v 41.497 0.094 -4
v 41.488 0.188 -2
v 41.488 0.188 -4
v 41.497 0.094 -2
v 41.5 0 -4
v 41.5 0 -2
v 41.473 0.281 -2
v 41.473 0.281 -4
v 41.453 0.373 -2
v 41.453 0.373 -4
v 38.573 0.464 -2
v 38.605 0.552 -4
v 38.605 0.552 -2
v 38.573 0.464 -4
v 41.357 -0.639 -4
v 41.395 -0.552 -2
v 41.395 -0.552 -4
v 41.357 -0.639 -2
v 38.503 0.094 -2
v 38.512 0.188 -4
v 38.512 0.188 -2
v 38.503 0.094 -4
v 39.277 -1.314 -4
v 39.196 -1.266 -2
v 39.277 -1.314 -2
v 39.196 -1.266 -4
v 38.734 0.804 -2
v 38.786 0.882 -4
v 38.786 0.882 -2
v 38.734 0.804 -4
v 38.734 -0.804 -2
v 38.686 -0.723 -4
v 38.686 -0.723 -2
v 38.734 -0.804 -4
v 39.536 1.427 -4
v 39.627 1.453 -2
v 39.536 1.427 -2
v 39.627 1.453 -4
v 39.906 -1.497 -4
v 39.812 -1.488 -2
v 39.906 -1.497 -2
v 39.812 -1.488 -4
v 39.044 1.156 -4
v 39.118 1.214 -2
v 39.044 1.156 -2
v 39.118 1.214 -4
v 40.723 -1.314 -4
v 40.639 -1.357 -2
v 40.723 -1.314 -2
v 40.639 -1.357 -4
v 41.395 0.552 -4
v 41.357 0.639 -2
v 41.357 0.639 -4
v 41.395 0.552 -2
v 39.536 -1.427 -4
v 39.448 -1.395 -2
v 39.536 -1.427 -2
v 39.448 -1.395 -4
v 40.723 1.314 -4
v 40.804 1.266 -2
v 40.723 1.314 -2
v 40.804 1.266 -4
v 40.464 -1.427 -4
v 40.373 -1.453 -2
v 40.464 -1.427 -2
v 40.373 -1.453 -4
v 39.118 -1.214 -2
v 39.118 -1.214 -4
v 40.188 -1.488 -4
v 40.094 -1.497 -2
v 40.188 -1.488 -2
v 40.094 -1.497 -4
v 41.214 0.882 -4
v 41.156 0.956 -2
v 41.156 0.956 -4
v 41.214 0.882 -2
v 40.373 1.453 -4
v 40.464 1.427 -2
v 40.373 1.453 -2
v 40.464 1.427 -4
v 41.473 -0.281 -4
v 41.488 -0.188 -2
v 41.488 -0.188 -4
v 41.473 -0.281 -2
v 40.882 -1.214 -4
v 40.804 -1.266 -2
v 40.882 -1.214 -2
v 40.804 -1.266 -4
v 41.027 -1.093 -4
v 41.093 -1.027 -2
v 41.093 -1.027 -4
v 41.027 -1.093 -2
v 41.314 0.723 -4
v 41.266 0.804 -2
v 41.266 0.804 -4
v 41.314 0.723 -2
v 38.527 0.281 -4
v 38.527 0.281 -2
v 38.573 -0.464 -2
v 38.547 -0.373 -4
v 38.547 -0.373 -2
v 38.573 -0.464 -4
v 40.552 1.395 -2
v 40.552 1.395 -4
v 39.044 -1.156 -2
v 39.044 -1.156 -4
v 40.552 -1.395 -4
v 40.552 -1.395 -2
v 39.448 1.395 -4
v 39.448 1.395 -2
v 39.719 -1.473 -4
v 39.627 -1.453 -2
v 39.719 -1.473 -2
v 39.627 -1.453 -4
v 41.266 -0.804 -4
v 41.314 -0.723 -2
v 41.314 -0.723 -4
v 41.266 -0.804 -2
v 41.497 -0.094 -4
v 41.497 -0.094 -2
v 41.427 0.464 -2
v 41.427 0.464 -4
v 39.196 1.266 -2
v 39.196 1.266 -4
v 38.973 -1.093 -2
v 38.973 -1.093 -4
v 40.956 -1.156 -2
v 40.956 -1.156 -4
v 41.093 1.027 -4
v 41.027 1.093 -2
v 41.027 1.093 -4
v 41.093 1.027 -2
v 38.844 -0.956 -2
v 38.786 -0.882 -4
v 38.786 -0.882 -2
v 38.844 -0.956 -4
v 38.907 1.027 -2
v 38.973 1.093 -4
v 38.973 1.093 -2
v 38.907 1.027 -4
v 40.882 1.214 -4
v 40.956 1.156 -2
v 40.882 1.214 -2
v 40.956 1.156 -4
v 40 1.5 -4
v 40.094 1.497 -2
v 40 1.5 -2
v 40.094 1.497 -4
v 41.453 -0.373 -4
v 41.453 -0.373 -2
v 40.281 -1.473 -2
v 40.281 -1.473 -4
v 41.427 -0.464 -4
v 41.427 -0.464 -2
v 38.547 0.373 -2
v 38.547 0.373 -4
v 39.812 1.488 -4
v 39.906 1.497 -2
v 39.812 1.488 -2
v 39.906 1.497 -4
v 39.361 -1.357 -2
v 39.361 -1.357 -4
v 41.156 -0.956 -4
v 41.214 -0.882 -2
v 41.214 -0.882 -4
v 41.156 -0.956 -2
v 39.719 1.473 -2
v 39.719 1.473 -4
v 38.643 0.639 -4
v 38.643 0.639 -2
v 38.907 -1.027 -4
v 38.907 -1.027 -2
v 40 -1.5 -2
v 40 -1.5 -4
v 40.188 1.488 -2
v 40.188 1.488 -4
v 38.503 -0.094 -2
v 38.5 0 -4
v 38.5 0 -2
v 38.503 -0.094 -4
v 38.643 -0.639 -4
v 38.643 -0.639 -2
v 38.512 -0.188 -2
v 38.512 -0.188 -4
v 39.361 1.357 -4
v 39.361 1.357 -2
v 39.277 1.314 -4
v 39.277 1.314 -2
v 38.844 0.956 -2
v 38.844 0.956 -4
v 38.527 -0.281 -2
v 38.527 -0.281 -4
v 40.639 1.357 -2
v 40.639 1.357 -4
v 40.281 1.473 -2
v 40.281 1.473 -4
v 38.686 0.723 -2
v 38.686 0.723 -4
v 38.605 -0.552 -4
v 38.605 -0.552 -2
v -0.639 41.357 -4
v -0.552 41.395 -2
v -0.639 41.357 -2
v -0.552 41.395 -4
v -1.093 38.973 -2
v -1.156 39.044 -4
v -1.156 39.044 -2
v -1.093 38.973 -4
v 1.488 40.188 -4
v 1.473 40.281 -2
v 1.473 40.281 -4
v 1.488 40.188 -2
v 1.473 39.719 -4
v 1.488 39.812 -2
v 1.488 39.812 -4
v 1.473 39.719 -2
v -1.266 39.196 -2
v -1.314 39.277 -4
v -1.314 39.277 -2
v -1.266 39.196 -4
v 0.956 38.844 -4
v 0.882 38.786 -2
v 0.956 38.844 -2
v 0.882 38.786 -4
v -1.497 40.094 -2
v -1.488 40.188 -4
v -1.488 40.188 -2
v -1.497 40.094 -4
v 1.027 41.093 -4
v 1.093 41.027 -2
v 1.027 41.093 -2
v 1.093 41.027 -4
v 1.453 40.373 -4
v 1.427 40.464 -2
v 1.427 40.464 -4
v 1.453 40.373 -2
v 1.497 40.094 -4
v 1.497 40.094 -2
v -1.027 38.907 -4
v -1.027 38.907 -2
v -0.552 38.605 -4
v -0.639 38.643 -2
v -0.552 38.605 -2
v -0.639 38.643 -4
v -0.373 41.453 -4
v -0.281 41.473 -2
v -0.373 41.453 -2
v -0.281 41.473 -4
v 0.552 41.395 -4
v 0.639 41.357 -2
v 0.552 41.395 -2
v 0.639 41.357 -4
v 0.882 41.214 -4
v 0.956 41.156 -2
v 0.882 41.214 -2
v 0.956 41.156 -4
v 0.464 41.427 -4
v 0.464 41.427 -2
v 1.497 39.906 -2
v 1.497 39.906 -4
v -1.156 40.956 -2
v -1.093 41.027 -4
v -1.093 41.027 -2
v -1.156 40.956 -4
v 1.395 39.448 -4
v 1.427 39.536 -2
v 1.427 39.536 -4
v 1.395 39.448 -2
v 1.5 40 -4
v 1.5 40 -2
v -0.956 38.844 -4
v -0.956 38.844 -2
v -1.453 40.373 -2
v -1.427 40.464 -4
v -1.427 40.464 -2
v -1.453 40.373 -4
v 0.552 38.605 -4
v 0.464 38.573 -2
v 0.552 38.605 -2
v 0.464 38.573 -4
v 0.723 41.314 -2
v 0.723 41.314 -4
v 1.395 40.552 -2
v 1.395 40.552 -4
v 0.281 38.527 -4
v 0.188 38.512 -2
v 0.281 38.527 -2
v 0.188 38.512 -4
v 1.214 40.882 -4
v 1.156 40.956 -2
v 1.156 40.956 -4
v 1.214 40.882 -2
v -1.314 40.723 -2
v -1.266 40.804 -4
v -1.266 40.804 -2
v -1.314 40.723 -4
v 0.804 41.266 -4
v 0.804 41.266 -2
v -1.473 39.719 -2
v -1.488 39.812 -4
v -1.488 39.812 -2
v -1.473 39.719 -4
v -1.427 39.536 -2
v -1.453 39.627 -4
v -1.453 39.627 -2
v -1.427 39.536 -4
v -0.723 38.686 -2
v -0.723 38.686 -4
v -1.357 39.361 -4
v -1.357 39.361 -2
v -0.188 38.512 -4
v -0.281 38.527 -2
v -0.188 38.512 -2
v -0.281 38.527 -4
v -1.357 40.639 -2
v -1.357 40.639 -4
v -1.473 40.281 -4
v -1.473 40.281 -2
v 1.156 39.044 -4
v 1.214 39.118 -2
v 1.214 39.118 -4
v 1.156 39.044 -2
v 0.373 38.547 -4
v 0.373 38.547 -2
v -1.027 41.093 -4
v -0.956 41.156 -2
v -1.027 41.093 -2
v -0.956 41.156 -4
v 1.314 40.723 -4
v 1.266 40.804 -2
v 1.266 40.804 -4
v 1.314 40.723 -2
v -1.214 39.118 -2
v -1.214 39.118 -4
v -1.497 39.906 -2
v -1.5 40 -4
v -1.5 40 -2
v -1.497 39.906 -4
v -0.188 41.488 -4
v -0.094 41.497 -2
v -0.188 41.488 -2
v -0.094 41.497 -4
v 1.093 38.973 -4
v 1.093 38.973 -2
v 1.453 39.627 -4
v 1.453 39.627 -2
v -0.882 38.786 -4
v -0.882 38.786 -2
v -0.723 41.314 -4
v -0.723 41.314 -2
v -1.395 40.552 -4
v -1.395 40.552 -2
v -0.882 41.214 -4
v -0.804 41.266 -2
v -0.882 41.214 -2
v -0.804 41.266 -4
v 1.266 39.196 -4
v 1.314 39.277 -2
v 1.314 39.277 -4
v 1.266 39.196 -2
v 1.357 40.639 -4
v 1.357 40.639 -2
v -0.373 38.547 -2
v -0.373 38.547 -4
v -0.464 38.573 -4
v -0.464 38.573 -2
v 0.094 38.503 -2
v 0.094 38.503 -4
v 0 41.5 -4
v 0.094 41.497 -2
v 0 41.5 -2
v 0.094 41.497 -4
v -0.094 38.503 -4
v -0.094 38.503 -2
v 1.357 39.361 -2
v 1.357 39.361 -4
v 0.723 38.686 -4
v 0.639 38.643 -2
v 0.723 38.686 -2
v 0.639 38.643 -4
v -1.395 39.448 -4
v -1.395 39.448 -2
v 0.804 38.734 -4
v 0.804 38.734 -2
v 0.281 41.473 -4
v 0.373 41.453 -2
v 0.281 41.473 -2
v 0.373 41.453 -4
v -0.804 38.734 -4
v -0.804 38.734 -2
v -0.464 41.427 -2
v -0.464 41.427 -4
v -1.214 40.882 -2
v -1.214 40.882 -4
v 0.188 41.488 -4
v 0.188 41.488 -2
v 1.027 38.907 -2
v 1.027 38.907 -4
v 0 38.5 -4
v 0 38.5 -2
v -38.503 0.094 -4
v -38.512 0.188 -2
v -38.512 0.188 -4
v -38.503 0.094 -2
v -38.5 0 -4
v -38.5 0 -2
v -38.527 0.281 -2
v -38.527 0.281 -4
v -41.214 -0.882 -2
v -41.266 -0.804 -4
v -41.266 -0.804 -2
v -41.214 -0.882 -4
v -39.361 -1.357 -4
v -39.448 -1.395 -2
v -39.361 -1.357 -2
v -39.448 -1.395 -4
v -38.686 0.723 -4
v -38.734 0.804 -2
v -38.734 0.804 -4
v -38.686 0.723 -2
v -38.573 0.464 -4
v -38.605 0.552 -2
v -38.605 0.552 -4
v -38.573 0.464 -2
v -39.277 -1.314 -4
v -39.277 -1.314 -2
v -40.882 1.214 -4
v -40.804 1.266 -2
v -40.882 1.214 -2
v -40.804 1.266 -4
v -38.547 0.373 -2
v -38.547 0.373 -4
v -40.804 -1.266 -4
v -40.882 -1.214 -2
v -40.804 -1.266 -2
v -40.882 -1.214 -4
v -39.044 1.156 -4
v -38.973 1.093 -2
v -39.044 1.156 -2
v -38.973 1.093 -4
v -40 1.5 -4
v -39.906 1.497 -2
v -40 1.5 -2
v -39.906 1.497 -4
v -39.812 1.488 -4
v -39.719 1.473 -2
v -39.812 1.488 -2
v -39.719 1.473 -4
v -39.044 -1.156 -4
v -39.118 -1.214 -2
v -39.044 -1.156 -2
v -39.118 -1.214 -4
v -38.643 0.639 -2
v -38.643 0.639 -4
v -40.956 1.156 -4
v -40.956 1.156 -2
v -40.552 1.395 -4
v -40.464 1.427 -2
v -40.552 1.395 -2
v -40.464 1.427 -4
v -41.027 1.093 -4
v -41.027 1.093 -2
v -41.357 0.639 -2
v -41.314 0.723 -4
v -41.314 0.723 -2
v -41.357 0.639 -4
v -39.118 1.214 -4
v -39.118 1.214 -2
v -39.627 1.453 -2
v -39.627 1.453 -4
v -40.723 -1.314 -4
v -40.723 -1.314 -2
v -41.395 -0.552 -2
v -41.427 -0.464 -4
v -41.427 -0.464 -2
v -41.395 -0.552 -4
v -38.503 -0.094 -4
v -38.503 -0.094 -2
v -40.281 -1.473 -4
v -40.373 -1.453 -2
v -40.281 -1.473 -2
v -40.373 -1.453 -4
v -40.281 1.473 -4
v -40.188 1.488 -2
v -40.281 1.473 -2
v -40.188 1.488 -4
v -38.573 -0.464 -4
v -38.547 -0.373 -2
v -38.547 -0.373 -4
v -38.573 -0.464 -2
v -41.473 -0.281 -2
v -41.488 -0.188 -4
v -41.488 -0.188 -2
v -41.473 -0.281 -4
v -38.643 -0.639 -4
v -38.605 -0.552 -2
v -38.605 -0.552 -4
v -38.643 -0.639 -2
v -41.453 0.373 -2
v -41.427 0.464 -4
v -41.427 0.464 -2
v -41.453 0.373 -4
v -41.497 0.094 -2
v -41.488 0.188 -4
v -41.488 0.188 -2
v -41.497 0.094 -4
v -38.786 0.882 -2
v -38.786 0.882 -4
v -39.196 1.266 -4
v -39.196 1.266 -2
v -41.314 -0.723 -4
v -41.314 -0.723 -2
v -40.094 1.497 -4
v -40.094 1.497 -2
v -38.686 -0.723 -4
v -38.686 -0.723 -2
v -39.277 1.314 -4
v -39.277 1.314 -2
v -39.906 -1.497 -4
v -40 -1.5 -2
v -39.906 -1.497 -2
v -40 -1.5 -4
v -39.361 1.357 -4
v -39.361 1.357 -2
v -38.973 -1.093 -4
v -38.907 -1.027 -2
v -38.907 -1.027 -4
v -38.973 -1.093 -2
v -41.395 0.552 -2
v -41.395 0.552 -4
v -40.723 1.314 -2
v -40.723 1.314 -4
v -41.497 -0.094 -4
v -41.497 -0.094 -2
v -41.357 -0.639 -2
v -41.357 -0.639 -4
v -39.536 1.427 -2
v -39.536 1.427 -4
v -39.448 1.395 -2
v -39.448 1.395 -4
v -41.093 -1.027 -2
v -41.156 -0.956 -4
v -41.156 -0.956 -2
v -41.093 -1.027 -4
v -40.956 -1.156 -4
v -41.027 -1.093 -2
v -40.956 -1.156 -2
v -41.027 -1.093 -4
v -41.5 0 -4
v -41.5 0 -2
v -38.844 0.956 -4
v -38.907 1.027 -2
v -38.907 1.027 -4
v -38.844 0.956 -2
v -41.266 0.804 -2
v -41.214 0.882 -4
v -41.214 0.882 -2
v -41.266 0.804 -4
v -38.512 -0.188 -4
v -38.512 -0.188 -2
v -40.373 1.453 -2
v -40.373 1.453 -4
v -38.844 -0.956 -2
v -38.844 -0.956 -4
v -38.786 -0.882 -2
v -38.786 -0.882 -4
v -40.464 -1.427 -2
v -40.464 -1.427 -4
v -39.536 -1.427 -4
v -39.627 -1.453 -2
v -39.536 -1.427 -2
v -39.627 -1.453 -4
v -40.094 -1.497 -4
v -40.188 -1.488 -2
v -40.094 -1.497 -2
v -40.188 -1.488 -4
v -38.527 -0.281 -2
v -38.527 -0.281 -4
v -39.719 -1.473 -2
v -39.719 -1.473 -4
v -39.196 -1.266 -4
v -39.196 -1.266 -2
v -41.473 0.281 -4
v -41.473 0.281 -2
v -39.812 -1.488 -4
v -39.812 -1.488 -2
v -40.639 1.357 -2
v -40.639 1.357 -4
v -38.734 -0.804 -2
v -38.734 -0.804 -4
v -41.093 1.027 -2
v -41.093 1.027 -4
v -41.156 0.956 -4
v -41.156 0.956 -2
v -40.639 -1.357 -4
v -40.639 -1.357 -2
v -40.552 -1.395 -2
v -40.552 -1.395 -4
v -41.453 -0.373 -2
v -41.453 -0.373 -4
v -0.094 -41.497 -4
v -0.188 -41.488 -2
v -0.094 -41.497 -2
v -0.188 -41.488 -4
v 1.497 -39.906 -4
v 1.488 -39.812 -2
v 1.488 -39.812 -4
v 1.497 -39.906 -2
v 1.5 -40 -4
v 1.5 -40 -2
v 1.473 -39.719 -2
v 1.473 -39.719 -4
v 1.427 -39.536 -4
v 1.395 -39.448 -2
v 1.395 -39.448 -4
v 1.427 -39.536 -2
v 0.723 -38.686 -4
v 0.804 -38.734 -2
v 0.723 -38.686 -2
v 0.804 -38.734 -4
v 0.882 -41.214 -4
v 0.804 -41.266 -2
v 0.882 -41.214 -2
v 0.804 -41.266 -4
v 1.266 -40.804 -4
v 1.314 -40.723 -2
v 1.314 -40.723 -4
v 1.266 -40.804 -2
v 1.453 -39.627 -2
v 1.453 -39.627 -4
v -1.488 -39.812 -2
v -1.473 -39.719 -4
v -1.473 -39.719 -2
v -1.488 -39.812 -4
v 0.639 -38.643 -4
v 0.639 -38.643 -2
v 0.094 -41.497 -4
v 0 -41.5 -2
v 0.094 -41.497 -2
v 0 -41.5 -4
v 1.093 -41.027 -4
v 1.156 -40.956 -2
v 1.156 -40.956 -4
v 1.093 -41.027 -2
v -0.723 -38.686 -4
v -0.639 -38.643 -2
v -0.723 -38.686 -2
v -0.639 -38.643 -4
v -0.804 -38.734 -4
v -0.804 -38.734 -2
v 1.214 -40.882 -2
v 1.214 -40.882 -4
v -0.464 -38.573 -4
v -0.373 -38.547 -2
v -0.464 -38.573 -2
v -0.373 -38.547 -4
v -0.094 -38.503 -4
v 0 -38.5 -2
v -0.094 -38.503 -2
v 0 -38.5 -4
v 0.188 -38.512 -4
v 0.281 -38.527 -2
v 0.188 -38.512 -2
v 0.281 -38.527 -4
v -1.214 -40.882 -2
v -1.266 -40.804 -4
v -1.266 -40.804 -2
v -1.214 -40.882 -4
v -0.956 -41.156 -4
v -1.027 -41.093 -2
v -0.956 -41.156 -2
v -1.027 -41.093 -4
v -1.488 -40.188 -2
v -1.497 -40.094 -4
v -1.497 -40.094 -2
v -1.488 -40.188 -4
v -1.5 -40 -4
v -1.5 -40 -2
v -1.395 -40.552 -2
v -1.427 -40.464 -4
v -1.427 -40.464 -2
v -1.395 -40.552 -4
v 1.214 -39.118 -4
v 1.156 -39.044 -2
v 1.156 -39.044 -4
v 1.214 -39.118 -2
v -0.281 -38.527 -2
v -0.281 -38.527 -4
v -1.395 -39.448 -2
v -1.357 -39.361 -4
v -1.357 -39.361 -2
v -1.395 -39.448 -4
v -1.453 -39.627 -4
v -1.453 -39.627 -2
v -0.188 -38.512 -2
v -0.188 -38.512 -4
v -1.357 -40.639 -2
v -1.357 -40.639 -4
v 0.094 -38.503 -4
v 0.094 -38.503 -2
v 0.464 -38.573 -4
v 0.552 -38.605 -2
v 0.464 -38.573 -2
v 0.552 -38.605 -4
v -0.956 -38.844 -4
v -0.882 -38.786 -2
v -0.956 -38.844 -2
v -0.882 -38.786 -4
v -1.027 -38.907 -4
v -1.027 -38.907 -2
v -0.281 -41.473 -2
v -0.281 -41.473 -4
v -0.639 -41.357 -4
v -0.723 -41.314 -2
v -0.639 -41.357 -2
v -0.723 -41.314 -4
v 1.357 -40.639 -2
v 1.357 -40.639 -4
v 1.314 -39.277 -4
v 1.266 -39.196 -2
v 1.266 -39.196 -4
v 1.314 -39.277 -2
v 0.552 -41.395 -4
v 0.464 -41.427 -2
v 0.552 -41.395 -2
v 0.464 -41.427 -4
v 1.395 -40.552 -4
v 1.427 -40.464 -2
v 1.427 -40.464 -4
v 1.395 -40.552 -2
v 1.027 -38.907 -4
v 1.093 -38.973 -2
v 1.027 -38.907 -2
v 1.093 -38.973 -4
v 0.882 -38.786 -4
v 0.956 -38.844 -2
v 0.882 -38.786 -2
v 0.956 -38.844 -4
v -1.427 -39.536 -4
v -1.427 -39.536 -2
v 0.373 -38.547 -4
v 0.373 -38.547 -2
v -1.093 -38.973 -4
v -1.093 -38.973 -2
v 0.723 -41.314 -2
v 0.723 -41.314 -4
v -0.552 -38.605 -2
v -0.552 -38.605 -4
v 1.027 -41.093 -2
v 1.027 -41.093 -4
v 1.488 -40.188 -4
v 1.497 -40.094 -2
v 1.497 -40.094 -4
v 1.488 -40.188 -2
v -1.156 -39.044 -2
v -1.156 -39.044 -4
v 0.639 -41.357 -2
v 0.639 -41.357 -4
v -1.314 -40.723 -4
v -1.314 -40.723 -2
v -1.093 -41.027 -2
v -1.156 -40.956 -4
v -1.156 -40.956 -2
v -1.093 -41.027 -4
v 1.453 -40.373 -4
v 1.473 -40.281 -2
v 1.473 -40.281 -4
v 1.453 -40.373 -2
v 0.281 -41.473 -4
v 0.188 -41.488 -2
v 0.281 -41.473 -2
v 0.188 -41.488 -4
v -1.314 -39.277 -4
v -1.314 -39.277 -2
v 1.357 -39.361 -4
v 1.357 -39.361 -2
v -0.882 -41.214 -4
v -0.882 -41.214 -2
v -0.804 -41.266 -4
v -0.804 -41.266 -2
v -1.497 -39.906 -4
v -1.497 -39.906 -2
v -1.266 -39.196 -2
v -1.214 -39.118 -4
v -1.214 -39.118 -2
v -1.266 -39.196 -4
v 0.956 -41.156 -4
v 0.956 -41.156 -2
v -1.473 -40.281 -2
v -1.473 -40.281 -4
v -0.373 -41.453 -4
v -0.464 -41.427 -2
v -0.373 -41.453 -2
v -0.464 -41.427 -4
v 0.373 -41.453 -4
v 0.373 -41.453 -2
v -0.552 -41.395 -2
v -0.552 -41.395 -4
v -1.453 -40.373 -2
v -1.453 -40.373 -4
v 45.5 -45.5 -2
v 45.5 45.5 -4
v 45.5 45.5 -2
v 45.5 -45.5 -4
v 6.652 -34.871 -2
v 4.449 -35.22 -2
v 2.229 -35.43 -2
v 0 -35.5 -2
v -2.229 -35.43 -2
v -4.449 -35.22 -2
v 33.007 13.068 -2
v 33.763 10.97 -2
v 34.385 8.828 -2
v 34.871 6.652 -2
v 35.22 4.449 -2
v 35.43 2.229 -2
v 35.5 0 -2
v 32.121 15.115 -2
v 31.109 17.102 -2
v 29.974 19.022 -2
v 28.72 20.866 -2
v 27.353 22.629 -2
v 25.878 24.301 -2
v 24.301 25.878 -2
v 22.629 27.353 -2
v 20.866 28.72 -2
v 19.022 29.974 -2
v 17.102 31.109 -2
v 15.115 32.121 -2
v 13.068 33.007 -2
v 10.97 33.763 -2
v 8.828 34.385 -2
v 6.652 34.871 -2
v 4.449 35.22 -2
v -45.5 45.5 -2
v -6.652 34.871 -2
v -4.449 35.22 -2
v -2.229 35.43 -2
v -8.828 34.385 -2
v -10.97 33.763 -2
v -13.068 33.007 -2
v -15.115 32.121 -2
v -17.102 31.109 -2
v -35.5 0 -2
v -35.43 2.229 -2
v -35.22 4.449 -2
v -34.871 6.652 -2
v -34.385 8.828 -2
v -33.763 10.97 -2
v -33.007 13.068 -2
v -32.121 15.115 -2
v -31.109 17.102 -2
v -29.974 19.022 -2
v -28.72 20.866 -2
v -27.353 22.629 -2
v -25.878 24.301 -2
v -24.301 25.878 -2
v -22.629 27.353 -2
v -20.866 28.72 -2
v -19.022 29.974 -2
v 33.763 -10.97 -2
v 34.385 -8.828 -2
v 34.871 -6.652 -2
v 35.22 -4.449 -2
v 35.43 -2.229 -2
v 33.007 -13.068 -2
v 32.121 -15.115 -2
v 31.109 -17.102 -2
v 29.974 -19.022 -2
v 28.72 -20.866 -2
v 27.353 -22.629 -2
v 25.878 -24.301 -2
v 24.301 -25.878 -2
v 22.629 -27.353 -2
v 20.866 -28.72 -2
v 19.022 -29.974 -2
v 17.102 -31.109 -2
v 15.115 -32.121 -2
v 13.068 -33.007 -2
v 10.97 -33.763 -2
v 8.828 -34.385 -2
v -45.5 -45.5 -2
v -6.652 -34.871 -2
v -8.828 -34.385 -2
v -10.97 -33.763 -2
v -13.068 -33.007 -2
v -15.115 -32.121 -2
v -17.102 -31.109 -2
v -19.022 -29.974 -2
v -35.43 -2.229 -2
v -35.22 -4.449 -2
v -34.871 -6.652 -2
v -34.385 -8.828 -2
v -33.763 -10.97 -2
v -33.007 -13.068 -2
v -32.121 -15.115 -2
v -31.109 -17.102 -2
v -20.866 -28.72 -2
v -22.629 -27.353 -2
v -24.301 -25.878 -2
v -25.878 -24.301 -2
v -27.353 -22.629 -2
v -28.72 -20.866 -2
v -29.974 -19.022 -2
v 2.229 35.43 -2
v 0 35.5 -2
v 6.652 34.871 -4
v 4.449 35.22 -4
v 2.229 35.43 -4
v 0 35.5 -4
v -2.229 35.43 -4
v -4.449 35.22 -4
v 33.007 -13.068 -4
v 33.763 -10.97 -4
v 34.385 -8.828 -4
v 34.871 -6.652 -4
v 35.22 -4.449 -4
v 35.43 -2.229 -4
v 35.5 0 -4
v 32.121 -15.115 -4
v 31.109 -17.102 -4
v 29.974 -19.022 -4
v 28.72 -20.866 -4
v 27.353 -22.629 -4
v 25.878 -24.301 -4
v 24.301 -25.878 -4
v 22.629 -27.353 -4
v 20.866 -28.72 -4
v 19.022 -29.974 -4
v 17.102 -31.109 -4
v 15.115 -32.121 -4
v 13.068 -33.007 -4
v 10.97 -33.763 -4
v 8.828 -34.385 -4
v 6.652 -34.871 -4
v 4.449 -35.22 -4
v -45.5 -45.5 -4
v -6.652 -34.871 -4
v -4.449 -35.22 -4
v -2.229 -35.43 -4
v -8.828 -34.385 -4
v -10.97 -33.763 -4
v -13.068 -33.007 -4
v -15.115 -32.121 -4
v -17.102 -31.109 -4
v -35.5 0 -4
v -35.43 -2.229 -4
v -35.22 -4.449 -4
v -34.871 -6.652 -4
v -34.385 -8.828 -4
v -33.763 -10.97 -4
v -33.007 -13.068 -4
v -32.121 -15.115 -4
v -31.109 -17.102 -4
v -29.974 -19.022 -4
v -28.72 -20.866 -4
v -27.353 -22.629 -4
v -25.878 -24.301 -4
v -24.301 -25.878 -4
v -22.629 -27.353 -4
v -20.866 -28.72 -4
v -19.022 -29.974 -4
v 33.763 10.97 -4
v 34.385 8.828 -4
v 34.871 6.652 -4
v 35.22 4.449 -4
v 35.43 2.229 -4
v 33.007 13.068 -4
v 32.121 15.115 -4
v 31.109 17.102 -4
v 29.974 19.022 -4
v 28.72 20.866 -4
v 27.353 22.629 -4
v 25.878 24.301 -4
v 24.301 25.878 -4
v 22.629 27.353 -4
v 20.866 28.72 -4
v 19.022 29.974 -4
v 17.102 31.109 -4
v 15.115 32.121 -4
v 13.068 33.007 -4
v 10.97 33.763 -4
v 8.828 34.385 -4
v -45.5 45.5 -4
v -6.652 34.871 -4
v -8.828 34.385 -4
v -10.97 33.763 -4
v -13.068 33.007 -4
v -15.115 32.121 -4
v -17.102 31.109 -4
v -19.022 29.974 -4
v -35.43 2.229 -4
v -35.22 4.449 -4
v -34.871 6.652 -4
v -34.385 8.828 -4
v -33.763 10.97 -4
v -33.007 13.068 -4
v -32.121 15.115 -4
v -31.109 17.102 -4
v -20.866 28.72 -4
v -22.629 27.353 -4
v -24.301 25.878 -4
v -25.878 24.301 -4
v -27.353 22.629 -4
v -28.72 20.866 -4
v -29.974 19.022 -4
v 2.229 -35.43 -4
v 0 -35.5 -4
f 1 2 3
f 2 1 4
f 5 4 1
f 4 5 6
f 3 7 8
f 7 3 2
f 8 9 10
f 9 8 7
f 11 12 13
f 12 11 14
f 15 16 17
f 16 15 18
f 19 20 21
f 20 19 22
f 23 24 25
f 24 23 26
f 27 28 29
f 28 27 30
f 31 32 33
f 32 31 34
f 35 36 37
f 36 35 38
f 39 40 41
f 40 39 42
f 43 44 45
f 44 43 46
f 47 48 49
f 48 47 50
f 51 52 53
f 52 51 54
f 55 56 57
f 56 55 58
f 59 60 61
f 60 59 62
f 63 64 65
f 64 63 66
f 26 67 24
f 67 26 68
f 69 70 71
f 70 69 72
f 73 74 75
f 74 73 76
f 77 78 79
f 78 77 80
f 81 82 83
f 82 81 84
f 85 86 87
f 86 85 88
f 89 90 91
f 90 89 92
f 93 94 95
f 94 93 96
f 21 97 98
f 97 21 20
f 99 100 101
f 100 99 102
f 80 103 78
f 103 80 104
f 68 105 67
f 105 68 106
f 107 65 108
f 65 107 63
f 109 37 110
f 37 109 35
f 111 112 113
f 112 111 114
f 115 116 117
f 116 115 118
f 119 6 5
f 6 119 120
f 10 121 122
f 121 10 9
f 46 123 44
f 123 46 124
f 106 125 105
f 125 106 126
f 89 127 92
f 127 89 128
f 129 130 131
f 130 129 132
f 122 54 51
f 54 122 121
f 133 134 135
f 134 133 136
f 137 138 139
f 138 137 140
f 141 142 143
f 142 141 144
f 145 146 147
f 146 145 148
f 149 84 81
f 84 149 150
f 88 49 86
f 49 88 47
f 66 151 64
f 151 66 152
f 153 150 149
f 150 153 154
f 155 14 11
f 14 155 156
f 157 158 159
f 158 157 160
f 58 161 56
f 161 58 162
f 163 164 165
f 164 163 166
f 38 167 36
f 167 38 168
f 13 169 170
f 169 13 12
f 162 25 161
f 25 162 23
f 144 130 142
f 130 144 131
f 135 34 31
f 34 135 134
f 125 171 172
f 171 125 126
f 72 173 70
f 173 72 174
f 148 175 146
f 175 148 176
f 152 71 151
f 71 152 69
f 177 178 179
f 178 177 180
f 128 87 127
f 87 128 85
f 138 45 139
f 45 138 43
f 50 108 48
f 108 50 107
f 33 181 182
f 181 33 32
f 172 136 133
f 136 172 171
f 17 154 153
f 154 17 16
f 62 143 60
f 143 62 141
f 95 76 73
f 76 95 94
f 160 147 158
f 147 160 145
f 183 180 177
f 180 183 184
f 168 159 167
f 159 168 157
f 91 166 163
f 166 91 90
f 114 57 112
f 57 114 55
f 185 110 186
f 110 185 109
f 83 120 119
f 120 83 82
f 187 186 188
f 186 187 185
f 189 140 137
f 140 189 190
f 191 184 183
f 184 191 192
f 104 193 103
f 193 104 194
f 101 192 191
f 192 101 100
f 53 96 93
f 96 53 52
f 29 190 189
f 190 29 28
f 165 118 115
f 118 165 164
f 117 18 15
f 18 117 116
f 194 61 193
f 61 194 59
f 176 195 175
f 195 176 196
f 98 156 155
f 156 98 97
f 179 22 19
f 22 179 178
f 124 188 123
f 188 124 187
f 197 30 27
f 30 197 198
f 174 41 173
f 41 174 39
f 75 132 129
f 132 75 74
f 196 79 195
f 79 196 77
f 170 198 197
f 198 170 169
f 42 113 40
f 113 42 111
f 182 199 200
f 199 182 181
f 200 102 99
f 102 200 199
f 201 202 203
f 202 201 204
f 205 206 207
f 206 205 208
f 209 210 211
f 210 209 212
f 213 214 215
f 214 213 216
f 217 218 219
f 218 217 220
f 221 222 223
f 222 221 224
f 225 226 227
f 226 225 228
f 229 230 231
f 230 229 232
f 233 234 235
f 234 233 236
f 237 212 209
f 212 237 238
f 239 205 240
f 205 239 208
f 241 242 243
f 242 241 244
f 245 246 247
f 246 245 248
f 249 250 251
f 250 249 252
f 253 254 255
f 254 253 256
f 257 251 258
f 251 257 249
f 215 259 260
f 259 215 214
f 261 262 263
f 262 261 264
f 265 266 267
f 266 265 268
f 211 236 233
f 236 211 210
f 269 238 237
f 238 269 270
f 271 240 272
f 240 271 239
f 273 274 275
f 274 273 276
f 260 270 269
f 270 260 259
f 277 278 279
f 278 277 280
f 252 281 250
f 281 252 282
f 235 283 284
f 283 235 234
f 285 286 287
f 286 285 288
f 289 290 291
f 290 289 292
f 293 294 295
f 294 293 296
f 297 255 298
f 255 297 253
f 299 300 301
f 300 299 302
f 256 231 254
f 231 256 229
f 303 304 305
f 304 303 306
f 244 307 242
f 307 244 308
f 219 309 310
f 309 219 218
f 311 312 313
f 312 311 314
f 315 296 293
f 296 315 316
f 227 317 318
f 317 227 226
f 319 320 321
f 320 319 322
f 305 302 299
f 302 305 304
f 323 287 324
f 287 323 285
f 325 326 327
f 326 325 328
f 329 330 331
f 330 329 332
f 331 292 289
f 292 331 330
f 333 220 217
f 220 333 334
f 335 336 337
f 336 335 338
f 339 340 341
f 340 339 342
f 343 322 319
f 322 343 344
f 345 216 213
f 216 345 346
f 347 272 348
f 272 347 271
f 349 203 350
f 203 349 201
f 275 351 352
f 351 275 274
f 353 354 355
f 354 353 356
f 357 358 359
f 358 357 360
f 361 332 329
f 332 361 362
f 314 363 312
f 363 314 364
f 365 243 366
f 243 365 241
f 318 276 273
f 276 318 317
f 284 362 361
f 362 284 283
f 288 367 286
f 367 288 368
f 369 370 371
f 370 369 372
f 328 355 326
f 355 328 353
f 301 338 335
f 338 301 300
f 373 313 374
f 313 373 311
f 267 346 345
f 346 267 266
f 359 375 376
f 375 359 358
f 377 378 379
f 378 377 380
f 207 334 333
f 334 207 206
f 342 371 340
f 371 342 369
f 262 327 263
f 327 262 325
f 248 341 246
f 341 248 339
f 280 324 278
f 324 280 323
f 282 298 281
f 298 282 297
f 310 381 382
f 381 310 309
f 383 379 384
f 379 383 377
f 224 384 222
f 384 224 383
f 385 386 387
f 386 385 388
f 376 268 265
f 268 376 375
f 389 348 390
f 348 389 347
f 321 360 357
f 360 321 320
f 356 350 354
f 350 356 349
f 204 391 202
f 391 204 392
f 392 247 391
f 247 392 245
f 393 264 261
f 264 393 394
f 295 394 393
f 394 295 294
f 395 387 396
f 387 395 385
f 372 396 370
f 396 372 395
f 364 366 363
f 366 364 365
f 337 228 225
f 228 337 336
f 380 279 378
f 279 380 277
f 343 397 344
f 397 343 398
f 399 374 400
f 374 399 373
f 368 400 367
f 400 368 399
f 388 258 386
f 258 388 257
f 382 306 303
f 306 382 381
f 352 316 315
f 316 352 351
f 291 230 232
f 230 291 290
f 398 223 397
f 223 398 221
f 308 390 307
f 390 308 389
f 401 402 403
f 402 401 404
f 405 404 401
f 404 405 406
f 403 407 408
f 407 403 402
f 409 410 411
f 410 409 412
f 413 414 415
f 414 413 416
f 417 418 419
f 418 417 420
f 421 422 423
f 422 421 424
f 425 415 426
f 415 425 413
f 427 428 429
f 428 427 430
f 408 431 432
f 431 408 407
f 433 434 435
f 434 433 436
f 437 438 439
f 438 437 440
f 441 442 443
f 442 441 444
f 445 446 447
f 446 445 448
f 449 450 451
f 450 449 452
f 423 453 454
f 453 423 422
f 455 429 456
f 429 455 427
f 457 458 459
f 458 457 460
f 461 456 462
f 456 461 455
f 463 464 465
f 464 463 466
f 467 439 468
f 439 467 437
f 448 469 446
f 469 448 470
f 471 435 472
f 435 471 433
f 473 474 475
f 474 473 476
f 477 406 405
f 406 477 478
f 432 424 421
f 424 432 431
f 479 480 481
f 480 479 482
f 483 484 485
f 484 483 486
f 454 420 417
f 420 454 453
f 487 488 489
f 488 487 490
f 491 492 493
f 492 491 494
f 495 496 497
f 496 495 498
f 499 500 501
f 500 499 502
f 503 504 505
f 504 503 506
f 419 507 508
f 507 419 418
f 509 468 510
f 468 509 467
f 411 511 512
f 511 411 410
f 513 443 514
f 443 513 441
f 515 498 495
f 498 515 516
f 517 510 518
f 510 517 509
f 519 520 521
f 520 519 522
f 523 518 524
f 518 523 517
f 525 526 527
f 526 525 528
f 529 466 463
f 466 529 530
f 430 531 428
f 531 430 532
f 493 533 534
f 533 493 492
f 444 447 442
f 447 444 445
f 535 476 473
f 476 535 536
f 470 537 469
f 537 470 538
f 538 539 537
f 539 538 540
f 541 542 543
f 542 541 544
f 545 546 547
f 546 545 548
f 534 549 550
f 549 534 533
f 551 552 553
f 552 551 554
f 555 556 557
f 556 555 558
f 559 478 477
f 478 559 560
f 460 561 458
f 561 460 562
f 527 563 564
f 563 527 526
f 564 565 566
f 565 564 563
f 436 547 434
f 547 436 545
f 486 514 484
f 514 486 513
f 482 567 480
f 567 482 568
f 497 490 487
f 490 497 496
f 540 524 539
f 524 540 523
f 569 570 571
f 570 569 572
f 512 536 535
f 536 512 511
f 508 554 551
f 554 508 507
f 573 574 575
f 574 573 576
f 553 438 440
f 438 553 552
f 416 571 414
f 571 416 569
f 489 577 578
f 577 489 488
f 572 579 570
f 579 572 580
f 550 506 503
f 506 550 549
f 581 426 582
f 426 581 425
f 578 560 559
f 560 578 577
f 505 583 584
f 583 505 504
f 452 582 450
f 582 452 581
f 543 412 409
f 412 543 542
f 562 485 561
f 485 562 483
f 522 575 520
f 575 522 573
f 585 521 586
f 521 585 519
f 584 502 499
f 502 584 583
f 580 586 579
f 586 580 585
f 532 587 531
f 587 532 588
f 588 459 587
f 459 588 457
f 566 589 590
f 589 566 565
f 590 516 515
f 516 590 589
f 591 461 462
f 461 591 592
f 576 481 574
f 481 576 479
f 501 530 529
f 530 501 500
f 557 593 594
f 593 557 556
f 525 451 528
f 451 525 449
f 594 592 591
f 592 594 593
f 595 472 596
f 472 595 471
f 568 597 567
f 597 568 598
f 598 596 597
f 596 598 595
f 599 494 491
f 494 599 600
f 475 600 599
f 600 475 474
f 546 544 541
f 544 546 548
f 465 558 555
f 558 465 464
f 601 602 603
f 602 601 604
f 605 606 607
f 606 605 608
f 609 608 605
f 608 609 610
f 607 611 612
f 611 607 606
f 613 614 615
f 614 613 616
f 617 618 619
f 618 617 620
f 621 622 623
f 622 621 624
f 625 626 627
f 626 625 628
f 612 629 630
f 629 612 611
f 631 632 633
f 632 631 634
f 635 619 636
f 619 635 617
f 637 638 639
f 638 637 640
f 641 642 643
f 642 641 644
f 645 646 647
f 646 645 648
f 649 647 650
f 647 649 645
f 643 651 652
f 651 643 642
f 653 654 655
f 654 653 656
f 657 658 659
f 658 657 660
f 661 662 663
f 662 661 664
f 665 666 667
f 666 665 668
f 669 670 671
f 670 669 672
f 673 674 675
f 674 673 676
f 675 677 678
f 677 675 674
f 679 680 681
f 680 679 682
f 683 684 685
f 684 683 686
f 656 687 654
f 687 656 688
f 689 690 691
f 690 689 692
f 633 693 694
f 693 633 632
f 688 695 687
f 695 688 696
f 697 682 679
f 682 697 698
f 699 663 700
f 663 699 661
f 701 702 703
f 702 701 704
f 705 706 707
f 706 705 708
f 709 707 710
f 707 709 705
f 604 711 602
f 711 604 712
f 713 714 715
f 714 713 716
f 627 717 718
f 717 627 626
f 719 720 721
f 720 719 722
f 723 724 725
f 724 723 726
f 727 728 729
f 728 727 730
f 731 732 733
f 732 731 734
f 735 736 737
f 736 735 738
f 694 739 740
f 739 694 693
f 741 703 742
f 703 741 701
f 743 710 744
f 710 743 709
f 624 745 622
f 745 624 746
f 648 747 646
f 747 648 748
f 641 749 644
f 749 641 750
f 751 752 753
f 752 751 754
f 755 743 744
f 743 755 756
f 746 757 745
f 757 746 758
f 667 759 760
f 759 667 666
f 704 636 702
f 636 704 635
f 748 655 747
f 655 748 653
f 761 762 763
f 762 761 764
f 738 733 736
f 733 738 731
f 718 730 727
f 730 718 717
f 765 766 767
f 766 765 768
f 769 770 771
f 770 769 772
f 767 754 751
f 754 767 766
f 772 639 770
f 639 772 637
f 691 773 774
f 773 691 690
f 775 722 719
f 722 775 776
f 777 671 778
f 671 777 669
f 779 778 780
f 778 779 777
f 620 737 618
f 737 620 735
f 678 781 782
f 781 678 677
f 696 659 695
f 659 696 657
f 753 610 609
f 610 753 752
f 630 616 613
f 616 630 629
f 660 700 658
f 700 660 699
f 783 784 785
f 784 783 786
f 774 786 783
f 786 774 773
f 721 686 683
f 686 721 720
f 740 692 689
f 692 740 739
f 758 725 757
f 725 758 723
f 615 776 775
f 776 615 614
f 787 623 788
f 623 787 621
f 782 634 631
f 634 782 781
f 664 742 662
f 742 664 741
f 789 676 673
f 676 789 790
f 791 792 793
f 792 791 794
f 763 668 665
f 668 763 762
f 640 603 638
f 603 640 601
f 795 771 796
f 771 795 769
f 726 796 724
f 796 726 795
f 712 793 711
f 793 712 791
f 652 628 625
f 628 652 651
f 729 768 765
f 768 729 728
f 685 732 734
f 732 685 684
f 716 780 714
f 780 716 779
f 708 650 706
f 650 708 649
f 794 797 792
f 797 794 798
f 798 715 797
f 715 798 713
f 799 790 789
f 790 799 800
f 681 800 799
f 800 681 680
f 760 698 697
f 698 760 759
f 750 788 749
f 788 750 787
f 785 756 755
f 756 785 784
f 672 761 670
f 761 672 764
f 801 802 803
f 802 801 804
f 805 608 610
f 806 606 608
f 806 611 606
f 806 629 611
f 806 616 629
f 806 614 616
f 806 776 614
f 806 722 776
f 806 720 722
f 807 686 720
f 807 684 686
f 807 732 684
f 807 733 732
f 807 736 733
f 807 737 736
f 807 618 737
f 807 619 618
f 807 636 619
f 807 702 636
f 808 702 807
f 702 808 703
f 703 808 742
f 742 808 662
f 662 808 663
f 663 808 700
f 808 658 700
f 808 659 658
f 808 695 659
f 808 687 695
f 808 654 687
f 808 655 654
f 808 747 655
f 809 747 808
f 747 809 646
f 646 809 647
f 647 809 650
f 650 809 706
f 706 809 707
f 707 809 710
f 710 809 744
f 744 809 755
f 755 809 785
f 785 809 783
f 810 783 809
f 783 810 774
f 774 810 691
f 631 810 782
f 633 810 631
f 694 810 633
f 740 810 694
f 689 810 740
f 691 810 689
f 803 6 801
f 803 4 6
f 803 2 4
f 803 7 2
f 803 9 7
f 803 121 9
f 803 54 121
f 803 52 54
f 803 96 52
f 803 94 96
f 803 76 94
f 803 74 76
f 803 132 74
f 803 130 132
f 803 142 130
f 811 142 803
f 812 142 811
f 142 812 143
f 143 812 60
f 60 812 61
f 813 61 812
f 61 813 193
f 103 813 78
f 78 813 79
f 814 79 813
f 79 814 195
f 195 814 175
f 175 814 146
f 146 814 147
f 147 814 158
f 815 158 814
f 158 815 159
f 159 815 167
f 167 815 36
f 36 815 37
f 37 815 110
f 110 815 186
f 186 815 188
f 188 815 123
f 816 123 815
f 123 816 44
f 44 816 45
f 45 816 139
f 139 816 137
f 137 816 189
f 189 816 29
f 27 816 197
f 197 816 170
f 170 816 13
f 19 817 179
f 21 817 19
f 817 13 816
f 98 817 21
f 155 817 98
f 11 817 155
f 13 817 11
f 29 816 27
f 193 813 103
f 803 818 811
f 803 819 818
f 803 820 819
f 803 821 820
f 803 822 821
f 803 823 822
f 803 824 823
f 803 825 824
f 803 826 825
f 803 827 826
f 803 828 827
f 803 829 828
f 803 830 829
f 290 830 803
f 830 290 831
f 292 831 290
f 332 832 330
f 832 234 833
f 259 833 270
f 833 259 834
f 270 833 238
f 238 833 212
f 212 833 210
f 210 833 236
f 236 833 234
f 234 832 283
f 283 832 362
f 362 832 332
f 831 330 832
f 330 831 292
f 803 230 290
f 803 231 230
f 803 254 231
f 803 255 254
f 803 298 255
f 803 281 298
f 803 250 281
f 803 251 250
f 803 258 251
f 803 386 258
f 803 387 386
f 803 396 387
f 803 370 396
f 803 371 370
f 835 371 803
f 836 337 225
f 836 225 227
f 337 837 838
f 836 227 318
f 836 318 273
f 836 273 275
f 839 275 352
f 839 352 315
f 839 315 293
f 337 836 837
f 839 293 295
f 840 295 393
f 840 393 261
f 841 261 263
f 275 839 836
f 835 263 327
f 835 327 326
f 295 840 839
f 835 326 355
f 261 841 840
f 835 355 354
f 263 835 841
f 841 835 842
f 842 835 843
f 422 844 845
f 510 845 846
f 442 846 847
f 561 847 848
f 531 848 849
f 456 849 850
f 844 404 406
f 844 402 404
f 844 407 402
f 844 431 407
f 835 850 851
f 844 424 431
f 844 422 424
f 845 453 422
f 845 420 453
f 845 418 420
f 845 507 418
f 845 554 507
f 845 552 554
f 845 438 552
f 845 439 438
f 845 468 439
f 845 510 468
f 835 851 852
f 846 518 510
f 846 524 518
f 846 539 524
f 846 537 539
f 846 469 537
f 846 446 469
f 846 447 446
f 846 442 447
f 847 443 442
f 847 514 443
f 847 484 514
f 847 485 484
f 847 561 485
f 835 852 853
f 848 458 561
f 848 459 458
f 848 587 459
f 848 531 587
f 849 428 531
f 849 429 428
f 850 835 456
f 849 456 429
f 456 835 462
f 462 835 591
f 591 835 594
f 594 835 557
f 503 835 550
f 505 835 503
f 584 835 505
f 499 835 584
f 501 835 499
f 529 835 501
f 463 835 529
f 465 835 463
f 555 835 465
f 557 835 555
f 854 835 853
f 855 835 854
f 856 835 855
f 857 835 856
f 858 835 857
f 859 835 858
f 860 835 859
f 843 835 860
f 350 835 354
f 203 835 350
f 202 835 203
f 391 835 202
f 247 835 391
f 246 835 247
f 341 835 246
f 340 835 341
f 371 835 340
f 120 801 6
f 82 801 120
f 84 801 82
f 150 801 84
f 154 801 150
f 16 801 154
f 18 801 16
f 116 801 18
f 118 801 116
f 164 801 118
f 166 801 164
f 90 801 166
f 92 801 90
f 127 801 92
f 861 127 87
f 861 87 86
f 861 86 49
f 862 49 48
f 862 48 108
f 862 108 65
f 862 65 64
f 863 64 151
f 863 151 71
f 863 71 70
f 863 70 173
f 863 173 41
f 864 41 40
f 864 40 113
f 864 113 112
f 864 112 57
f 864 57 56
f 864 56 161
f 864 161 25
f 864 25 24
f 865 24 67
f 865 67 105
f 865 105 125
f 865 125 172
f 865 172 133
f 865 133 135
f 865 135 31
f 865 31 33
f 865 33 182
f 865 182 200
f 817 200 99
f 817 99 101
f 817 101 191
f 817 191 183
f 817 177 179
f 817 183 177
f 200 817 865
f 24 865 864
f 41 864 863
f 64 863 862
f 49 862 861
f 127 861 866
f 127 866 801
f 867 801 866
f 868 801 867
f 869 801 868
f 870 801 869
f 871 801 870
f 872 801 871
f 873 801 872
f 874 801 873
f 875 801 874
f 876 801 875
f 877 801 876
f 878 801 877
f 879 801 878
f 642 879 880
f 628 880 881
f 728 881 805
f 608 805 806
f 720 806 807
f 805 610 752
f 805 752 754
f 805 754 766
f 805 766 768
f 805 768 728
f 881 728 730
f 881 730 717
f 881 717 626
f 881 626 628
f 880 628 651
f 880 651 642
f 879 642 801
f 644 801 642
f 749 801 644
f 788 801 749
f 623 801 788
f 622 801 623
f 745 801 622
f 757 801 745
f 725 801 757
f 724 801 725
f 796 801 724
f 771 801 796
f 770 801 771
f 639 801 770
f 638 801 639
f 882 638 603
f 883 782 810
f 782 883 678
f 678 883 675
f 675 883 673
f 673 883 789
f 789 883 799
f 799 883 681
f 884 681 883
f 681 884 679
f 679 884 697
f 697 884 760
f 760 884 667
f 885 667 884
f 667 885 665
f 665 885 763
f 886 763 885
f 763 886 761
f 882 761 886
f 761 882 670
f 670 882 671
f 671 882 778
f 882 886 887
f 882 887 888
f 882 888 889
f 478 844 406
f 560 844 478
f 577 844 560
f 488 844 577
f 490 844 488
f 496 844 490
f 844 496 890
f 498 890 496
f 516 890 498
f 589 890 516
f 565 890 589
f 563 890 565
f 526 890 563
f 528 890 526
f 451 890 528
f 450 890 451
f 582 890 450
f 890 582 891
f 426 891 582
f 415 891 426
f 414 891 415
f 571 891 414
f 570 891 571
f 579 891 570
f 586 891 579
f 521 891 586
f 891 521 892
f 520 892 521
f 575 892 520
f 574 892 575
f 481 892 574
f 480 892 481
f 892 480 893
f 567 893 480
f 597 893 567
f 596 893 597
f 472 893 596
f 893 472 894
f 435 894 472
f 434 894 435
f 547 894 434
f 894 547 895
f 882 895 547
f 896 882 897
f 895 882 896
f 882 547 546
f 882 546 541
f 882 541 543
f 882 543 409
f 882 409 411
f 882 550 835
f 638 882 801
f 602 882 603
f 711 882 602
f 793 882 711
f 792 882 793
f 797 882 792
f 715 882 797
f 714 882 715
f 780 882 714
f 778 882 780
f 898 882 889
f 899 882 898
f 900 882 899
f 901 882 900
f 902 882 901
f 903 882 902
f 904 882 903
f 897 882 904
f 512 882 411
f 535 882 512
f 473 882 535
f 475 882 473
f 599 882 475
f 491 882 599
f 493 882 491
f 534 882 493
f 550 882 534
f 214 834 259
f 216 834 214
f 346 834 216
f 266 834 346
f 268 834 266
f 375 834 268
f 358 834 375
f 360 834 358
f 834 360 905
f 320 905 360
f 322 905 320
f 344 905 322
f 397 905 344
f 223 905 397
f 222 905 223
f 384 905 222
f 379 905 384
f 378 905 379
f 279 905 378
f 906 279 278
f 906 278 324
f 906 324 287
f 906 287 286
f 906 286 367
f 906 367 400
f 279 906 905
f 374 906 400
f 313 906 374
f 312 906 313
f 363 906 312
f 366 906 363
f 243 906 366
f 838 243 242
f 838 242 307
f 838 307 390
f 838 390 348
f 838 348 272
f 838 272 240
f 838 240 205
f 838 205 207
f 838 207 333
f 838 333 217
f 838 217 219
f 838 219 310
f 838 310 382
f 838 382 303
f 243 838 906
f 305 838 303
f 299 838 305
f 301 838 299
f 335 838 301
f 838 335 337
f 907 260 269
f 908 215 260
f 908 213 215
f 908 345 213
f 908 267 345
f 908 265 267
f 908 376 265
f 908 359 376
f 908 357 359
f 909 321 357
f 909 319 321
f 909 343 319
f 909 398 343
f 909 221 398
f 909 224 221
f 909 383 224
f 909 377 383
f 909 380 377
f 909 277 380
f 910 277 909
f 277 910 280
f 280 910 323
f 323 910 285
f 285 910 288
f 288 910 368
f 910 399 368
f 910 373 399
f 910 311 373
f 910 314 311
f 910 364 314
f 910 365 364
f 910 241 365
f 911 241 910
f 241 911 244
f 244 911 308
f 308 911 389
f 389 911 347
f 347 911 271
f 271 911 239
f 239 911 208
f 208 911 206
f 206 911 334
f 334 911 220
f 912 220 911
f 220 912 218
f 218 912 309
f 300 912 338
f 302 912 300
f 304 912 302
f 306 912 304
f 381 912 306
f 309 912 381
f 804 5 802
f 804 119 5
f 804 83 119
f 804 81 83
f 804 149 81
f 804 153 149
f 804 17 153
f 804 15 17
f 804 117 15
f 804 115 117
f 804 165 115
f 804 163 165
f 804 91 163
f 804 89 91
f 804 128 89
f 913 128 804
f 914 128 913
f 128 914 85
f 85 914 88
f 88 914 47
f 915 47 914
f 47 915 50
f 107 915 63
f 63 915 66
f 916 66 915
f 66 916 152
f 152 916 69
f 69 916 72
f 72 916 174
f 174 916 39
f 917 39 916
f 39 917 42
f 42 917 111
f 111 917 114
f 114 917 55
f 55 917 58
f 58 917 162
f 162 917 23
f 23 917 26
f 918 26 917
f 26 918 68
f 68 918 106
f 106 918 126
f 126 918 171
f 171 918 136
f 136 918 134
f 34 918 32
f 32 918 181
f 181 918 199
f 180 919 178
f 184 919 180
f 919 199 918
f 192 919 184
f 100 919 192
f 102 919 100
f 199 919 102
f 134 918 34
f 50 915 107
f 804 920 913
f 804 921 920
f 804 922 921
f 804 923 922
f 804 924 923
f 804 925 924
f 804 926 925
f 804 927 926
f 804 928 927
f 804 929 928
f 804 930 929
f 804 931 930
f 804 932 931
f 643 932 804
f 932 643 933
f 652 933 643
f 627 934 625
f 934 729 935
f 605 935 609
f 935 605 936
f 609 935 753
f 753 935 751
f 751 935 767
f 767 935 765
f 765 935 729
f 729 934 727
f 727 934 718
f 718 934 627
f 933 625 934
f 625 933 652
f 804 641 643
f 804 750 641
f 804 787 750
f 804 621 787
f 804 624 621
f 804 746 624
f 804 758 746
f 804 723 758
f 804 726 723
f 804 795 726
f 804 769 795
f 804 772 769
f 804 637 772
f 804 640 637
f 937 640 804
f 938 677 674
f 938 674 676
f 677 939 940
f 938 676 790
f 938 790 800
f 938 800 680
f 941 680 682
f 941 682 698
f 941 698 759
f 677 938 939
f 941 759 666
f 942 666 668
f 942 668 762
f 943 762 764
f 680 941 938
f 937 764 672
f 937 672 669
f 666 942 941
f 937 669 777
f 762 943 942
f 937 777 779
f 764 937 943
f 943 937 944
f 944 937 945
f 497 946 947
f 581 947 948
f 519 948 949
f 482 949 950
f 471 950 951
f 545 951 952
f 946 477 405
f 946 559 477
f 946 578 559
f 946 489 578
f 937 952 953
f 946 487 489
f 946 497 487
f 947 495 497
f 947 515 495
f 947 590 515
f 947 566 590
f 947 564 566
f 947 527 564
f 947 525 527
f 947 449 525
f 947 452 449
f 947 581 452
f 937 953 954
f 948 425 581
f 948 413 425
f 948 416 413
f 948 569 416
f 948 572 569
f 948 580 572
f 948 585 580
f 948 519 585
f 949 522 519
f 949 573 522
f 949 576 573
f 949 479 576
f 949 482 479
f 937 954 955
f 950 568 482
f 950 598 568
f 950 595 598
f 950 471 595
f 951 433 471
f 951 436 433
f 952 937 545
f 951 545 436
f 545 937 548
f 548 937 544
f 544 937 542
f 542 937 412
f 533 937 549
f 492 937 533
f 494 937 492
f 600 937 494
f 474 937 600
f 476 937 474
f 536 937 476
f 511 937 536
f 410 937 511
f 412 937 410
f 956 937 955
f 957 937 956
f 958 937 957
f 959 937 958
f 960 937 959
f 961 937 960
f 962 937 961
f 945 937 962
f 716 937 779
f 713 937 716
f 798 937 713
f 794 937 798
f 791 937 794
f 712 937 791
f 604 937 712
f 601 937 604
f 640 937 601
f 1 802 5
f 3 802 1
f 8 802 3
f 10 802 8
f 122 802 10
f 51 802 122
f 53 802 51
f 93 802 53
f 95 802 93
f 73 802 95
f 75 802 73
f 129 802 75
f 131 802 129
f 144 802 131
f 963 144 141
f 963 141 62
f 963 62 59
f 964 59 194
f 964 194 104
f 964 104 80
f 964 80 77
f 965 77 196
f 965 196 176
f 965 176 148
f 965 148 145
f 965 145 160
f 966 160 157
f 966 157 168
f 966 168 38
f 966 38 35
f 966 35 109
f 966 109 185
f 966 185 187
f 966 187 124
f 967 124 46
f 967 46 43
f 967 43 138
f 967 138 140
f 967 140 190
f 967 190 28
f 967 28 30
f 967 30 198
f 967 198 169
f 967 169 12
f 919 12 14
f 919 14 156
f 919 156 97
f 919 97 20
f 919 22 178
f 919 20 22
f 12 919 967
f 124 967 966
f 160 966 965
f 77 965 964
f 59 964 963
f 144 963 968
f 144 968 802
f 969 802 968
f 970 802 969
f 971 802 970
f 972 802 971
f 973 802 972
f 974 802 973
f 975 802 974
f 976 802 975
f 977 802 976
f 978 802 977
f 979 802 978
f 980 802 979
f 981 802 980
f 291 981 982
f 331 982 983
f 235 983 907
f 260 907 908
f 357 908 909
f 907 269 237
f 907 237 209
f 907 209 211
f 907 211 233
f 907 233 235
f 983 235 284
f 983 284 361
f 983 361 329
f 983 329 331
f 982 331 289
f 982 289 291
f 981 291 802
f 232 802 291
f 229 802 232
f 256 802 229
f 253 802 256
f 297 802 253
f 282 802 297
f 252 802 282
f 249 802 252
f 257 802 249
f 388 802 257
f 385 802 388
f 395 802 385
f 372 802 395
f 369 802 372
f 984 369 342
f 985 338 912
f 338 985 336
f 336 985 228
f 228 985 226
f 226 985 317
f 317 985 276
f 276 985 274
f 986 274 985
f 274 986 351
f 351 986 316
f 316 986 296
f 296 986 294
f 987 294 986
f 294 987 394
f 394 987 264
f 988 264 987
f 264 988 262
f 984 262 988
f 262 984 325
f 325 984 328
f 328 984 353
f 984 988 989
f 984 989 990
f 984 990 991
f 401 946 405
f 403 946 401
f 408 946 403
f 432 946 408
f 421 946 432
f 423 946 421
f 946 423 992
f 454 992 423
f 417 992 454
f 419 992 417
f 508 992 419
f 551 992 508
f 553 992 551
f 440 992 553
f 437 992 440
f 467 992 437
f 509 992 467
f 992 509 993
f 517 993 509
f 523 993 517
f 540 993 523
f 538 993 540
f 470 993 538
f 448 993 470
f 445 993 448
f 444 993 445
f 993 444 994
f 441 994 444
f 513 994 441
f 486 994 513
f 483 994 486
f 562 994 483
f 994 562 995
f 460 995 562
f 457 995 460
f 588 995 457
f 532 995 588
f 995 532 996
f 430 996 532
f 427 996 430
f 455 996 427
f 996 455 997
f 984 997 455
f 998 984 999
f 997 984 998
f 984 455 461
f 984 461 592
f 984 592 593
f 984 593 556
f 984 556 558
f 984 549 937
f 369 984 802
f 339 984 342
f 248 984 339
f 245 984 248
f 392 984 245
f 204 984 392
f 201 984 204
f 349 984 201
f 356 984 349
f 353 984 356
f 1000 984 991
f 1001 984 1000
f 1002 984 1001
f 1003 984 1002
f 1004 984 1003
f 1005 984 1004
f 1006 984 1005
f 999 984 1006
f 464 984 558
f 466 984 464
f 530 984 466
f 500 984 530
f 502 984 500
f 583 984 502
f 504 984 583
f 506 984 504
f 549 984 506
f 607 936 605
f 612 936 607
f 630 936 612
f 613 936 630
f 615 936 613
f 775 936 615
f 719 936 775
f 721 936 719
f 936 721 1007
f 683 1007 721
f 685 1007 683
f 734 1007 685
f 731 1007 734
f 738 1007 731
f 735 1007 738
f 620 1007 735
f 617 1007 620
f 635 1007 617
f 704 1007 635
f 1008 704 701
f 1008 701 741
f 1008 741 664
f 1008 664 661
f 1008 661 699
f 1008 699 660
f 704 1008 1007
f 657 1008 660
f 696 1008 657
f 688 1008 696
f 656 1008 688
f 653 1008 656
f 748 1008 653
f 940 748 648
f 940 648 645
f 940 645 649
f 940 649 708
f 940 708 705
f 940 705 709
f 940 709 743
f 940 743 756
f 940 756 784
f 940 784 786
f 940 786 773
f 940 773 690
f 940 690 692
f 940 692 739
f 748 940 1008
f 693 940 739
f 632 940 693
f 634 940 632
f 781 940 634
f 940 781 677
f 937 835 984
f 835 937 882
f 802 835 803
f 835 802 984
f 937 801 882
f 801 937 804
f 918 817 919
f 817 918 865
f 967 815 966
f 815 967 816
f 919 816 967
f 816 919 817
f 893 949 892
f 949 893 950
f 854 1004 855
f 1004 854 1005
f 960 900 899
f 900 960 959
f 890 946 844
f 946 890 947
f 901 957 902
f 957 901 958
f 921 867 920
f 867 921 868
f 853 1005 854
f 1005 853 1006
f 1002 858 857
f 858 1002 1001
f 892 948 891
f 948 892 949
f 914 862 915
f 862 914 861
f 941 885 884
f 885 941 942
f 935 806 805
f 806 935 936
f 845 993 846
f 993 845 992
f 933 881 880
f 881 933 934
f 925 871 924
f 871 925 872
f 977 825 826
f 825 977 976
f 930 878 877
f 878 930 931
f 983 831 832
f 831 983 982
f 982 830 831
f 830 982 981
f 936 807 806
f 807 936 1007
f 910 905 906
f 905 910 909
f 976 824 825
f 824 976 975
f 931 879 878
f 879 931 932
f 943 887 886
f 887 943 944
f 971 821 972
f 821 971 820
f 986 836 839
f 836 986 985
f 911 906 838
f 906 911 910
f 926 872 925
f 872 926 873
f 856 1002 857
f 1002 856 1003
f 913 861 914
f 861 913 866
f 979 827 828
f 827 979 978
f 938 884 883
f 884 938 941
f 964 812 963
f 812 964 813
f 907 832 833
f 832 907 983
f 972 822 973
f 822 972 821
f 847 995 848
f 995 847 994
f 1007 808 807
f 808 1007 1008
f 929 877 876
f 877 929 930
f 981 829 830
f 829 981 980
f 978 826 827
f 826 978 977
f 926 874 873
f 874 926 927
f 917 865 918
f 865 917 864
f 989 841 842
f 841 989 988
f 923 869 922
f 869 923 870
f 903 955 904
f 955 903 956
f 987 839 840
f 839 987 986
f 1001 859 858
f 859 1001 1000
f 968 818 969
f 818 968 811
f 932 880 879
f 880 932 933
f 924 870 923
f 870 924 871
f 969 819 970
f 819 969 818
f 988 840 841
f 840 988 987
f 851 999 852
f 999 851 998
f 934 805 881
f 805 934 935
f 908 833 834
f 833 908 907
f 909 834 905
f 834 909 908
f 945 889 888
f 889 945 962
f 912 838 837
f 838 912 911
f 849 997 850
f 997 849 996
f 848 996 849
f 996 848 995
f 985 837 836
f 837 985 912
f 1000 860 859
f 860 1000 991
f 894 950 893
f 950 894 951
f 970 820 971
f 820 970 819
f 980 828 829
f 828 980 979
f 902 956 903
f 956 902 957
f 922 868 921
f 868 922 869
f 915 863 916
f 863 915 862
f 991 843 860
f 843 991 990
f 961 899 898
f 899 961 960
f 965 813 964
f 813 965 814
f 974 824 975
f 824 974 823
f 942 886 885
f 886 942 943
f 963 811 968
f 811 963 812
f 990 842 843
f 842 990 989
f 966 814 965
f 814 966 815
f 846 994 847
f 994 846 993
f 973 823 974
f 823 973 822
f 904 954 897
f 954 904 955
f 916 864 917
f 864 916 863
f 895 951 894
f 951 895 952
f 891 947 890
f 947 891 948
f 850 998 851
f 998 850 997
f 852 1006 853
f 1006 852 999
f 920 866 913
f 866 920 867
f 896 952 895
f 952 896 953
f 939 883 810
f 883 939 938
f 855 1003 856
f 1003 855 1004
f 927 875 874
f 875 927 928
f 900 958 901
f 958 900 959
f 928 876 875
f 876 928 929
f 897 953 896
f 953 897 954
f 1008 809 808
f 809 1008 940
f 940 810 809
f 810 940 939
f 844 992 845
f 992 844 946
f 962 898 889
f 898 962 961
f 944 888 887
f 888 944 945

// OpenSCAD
// Famicom Disk Cutting Jig (2.8" disk)
// All dimensions in millimeters

disk_diameter = 71;
hub_hole_diameter = 11;
jig_thickness = 2;
jig_border = 10;
alignment_hole_diameter = 3;
alignment_hole_offset = 40;

$fn = 100; // smoothness of round shapes

// Lower half of the jig
module lower_jig() {
    difference() {
        // Outer block
        cube([disk_diameter + 2 * jig_border, disk_diameter + 2 * jig_border, jig_thickness], center=true);
        
        // Circular cutout for disk
        translate([0, 0, 0])
            cylinder(h = jig_thickness + 2, d = disk_diameter, center=true);
        

        // Peg alignment holes
        for (angle = [0, 90, 180, 270]) {
            translate([alignment_hole_offset * cos(angle), alignment_hole_offset * sin(angle), 0])
                cylinder(h = jig_thickness + 1, d = alignment_hole_diameter, center=true);
        }
    }
}

// Upper half (presses down, with holes for pegs)
module upper_jig() {
    difference() {
        cube([disk_diameter + 2 * jig_border, disk_diameter + 2 * jig_border, jig_thickness], center=true);

        // Optional shallow recess to prevent slipping
        translate([0, 0, -0.25])
            cylinder(h = 1, d = disk_diameter - 2, center=true);

        // Alignment peg holes
        for (angle = [0, 90, 180, 270]) {
            translate([alignment_hole_offset * cos(angle), alignment_hole_offset * sin(angle), 0])
                cylinder(h = jig_thickness + 1, d = alignment_hole_diameter, center=true);
        }
    }
}

// Render both
translate([0, 0, -jig_thickness - 1]) lower_jig();
